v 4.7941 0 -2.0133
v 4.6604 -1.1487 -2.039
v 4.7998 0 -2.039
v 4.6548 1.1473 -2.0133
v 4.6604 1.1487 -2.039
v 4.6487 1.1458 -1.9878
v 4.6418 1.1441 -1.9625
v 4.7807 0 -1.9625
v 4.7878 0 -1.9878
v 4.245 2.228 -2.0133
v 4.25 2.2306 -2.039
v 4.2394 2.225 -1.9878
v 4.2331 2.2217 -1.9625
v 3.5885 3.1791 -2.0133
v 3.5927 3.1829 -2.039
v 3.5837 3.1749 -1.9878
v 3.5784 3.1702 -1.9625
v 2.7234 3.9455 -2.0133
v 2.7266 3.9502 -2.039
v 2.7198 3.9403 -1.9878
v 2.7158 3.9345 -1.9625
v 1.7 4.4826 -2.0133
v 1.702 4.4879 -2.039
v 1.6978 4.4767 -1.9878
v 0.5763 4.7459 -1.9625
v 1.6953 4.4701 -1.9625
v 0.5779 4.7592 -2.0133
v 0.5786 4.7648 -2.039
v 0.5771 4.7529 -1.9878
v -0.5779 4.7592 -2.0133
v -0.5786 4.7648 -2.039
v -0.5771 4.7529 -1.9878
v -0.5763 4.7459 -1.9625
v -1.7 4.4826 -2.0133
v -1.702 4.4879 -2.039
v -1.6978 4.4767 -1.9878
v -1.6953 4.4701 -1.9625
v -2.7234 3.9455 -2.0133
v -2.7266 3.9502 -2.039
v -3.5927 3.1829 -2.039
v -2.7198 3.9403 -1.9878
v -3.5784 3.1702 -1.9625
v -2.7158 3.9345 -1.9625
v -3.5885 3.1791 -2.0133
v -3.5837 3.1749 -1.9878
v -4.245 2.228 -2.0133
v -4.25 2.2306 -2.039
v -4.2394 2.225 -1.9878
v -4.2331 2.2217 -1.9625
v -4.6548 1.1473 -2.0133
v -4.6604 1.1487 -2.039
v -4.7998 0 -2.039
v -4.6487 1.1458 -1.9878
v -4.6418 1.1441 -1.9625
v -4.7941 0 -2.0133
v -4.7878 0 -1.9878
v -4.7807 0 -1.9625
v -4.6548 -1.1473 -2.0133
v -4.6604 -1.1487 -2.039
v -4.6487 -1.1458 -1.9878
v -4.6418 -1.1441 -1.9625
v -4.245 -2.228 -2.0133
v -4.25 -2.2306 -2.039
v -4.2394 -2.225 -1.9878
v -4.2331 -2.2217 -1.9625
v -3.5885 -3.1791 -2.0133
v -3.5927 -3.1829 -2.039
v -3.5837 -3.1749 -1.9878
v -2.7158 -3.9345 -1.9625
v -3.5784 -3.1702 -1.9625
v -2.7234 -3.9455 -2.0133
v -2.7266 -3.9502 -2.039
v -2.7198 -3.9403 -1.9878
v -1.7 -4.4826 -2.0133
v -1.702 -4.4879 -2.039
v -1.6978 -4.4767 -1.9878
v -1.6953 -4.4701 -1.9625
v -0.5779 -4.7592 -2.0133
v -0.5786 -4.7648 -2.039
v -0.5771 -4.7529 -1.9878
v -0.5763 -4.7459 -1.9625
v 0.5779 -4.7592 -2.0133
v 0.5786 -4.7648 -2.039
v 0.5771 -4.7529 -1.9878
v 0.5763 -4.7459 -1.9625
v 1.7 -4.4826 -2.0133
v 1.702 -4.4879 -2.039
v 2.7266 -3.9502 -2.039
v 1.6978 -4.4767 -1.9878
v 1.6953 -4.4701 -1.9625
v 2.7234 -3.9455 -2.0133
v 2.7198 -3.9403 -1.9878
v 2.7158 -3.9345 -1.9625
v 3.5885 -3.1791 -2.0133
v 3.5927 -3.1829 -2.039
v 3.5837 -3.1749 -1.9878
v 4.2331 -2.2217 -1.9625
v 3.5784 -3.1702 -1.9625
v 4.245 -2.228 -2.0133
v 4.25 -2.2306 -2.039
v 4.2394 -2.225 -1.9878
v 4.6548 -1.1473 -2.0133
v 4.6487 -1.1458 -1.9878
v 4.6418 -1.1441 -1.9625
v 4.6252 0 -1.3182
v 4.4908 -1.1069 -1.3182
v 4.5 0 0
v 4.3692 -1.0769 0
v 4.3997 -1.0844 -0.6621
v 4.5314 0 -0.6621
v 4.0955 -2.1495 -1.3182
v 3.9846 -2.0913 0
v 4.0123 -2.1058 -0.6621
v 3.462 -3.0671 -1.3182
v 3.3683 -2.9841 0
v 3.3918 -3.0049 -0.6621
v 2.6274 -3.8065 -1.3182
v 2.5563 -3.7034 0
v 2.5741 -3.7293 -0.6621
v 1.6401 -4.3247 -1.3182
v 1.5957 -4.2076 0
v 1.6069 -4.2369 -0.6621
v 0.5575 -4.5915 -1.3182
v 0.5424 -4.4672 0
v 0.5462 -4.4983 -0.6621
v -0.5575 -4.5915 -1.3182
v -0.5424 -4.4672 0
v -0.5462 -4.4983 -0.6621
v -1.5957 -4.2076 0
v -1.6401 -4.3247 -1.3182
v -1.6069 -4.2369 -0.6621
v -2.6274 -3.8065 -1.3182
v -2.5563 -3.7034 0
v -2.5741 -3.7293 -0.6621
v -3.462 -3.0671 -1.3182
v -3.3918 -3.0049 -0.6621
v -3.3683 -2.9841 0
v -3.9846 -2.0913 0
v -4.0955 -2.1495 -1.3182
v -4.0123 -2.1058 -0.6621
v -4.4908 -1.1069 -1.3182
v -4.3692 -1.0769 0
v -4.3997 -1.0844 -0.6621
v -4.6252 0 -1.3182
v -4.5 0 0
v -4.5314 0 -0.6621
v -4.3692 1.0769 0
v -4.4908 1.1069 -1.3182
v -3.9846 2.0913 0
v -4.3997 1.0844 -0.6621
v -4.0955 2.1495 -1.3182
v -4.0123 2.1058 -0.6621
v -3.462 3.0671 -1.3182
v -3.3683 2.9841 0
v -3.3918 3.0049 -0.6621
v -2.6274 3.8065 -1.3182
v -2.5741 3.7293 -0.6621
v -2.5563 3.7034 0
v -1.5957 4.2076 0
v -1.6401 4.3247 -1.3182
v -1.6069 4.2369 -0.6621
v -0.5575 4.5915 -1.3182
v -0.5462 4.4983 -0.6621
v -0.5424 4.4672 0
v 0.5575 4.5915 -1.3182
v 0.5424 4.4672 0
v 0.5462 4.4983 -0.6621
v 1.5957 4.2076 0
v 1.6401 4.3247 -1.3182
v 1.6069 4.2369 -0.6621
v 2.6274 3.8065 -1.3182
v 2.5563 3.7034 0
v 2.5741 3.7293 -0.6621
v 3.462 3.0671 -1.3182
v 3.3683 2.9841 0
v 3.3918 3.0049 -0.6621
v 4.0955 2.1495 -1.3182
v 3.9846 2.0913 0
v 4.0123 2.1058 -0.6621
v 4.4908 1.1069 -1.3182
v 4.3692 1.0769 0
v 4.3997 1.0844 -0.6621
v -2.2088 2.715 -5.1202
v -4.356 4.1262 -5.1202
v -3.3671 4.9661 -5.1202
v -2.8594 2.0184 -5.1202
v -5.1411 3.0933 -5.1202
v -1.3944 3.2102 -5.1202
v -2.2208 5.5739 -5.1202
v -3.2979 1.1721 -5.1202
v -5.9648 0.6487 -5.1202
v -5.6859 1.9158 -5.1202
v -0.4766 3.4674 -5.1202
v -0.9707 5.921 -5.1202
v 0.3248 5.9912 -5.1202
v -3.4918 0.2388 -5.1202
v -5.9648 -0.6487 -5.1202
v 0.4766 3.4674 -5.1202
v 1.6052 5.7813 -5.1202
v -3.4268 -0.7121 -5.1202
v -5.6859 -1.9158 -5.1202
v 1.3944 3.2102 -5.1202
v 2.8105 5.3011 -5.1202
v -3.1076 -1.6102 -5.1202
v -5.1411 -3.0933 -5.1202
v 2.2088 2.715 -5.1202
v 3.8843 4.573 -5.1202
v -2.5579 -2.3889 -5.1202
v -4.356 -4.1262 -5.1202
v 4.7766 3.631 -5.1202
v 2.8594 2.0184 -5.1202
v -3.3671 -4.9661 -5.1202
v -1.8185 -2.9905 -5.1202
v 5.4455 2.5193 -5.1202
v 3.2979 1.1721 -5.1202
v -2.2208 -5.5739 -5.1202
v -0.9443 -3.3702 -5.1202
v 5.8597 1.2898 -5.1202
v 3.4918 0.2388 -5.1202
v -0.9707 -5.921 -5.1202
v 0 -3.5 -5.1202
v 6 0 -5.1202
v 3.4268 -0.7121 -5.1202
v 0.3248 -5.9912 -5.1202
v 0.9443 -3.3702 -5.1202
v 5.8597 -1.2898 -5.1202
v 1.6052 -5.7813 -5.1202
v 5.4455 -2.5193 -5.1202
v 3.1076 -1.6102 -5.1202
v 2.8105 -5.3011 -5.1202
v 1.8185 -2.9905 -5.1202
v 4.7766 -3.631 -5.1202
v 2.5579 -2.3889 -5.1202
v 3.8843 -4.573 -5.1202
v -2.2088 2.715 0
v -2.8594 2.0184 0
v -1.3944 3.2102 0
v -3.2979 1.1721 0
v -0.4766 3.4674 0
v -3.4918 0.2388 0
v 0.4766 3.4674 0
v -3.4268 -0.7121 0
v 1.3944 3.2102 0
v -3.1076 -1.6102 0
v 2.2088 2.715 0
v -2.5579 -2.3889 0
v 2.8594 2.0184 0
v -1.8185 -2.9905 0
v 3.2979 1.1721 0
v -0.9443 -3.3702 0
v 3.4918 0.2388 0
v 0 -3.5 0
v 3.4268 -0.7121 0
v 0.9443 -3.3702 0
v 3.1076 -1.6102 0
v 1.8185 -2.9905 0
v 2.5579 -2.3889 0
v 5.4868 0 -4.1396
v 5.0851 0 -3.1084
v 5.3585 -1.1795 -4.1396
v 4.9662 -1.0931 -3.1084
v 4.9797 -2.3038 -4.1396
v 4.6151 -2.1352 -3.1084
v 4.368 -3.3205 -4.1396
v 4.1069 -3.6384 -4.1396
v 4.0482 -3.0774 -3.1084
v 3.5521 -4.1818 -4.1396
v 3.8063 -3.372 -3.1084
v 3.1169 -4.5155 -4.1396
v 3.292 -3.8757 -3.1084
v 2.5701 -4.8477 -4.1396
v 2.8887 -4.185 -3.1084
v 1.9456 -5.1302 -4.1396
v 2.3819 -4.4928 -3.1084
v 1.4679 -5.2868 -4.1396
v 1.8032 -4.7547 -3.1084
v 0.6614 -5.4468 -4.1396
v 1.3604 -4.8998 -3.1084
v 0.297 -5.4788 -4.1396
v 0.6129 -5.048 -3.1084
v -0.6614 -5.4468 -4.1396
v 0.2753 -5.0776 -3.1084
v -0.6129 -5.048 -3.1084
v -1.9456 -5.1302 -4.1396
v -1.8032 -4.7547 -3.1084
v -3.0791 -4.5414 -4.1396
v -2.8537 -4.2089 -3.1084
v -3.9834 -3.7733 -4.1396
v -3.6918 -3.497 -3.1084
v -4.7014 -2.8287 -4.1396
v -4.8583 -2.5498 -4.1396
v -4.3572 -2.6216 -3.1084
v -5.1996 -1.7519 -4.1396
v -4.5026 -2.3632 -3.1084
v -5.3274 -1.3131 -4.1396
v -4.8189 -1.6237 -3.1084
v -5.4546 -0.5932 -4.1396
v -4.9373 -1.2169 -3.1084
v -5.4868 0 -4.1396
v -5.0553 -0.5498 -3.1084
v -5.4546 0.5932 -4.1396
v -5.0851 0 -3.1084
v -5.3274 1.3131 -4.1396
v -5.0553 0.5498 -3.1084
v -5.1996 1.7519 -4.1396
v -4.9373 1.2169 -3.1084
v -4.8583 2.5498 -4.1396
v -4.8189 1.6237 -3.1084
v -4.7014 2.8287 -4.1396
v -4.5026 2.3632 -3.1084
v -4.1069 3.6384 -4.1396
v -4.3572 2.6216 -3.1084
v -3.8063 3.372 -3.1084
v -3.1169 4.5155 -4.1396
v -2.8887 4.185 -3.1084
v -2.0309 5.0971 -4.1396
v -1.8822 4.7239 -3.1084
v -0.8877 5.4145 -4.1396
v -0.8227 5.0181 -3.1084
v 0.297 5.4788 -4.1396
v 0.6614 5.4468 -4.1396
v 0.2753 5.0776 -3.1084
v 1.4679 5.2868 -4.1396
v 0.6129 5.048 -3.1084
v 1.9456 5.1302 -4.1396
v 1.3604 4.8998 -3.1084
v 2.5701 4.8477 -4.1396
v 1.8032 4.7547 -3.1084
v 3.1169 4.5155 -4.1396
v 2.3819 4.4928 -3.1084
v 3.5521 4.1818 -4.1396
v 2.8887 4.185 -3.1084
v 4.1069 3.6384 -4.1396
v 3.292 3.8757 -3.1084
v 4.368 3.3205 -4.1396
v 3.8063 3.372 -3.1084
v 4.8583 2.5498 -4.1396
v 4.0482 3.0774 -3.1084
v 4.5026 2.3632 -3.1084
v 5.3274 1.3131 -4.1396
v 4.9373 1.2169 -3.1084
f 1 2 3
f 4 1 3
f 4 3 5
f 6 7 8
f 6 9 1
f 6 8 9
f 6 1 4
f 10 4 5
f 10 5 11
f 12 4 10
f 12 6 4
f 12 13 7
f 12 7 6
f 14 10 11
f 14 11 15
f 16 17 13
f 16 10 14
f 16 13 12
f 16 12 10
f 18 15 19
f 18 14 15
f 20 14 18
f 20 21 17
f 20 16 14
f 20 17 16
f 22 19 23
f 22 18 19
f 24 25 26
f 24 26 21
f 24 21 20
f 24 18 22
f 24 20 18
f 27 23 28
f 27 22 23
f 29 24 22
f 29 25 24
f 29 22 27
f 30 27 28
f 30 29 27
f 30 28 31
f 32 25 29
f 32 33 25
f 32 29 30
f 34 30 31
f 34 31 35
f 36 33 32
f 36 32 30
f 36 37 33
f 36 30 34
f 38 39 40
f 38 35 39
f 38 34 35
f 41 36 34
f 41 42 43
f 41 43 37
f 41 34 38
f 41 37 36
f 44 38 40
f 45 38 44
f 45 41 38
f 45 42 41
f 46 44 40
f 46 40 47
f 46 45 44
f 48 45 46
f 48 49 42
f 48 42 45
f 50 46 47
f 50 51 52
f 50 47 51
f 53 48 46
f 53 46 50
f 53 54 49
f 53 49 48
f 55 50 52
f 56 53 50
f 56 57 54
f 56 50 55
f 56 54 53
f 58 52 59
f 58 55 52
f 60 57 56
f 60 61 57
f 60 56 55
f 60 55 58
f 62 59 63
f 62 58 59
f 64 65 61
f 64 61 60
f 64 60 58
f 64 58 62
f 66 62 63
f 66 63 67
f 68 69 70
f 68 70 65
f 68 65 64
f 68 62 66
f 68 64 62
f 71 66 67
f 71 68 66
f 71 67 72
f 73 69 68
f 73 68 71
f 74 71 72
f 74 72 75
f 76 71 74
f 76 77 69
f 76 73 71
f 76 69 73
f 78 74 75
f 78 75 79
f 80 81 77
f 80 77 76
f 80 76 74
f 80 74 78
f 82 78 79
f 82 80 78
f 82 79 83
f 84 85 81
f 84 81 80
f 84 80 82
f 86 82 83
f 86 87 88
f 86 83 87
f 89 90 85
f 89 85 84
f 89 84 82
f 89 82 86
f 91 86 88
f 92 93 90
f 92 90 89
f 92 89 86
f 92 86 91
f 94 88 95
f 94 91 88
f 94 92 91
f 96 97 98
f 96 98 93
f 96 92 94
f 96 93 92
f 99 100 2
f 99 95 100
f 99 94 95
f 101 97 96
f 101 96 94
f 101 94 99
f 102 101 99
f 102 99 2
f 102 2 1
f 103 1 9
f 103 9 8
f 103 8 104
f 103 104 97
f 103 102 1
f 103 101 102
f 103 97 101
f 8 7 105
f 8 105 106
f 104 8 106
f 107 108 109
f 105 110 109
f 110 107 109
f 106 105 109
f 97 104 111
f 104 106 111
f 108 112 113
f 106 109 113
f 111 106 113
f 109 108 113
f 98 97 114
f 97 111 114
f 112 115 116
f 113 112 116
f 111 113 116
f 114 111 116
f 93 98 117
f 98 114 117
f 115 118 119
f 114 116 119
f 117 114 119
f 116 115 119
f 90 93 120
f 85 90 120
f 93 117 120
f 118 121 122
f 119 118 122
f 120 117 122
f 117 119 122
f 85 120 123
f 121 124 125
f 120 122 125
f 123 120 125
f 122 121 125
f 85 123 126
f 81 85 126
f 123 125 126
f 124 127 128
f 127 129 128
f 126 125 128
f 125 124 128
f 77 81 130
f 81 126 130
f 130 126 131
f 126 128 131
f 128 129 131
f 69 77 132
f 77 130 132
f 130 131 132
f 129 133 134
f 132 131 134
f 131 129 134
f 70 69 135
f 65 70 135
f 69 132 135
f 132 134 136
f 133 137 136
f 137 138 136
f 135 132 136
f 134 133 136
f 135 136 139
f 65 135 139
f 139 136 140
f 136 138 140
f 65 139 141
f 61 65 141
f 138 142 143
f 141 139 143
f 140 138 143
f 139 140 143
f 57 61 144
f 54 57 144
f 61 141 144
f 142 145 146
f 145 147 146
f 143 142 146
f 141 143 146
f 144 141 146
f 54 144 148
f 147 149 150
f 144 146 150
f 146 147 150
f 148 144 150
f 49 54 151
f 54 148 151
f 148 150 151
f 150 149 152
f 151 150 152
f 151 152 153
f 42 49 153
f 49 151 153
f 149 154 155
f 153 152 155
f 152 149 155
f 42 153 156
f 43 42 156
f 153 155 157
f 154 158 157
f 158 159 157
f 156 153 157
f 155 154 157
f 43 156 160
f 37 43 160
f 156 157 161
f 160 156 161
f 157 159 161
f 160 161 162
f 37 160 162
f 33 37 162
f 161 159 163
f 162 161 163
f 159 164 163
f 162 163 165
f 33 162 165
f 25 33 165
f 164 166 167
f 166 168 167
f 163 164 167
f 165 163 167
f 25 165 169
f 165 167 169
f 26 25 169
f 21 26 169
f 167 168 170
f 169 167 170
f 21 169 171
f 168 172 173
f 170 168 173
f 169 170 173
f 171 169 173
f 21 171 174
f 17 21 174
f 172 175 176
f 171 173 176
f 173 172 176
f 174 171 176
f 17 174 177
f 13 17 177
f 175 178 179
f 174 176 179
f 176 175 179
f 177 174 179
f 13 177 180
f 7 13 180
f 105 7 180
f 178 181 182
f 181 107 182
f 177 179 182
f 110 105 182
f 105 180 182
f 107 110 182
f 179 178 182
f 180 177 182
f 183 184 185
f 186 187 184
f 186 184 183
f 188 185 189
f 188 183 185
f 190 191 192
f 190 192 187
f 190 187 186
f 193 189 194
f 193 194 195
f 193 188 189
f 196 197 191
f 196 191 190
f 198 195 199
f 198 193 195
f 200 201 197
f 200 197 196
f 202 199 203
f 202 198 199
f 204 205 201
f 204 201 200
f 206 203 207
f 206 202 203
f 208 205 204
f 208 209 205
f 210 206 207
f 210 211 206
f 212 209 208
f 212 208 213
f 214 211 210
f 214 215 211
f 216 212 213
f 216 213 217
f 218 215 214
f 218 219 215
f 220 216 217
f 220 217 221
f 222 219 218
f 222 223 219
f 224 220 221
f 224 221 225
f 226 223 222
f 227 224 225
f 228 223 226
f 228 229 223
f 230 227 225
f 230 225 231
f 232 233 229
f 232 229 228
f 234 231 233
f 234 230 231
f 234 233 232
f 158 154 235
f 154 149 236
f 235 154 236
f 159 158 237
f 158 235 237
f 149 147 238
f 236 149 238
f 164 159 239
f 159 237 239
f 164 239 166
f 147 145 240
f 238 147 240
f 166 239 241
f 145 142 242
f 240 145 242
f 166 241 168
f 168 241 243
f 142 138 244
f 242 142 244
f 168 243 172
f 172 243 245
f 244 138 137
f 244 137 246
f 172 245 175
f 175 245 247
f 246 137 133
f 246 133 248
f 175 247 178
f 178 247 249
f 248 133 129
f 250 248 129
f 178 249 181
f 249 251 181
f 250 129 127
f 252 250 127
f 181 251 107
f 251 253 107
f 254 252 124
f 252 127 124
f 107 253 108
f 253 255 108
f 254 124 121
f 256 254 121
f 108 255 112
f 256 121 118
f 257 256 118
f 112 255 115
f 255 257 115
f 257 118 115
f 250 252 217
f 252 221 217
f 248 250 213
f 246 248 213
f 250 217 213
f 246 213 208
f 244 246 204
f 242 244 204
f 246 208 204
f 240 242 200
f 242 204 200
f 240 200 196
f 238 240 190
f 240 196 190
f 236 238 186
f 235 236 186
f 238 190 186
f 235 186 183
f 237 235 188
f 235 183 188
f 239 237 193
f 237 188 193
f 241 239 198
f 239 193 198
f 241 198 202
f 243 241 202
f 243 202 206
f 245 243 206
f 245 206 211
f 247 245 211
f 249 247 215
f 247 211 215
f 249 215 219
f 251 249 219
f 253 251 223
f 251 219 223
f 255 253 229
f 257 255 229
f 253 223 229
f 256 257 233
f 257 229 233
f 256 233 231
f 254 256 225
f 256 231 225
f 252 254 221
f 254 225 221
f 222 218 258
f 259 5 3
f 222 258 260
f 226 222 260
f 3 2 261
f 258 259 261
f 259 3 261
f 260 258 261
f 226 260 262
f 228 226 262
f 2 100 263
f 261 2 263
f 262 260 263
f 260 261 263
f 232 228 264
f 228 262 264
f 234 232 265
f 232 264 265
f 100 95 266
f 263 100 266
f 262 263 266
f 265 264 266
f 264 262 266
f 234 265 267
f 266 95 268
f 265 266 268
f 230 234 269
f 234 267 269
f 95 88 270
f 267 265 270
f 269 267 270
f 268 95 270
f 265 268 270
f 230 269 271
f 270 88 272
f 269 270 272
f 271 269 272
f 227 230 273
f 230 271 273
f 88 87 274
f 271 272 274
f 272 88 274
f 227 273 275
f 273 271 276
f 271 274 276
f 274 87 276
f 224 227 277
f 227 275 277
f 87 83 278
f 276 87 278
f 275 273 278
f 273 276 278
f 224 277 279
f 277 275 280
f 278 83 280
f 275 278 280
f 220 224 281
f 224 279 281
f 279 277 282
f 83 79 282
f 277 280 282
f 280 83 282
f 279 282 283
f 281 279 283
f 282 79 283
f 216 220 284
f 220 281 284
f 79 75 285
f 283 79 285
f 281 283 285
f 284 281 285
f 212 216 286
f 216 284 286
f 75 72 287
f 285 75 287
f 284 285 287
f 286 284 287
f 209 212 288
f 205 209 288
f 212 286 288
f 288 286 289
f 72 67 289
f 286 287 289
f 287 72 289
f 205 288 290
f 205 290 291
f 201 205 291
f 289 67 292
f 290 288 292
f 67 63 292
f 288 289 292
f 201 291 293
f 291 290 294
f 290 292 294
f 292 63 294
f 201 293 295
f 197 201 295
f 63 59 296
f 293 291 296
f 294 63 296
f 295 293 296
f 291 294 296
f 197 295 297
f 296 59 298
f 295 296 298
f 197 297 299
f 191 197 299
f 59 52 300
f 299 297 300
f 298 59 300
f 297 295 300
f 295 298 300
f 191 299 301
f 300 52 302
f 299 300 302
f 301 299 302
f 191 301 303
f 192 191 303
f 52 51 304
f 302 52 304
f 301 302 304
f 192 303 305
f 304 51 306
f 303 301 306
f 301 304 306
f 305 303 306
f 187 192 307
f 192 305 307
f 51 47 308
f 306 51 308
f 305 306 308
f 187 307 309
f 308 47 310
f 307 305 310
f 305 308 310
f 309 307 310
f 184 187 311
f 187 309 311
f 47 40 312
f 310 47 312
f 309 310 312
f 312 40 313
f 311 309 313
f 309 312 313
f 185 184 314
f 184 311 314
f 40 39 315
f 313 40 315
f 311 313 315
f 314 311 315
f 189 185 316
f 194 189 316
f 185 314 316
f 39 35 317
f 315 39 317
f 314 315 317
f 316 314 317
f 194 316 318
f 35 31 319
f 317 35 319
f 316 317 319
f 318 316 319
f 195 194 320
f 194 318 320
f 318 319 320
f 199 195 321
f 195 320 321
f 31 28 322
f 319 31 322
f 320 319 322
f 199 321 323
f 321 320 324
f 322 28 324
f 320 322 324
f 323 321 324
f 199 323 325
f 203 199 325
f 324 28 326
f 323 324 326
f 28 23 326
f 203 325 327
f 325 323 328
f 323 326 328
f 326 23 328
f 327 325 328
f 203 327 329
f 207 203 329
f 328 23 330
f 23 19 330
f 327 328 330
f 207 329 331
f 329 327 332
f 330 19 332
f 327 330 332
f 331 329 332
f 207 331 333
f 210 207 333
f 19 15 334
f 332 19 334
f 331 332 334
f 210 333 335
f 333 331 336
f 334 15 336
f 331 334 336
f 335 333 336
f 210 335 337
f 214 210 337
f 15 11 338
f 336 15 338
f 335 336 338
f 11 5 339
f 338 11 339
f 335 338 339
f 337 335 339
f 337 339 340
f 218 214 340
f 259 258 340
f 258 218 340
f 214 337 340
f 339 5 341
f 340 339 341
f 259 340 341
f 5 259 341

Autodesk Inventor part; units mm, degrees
ref_plane "YZ Plane" through (0, 0, 0) normal (1, 0, 0) x (0, 1, 0)
ref_plane "XZ Plane" through (0, 0, 0) normal (0, 1, 0) x (-1, 0, 0)
ref_plane "XY Plane" through (0, 0, 0) normal (0, 0, 1) x (1, 0, 0)
sketch "Sketch1" plane through (0, 0, 0) normal (0, 1, 0) x (-1, 0, 0)
  line L0 (0, 0) -> (0, -8)
  line L1 (0, 0) -> (-4.5, 0)
  arc A0 (-4.7918, -2) -> (-4.5, 0) centre (-11.5, 0) ccw
  line L2 (-6, -5.1202) -> (0, -5.1202)
  arc A1 (-6, -5.1202) -> (-4.7918, -2) centre (-14.5898, 0) ccw
  dimension "d6" = 8
  dimension "d7" = 7
  dimension "d9" = 12
  dimension "d10" = 9
  dimension "d11" = 10
  dimension "d12" = 2
revolve "Revolution1" add sketch "Sketch1" angle 360 about axis through (0, 0, 0) along (0, 0, -1)
sketch "Sketch2" plane through (0, 0, 0) normal (0, 0, 1) x (1, 0, 0)
  circle A0 centre (0, 0) radius 4.5 construction
hole "Hole1" at (0, 0, 0) direction (0, 0, -1) diameter 7 depth 5.1202
fillet "Fillet1" radius 1 1 edges at (-4.7918, 0, -2)
properties part number "VenturiEinsatz" material "Copper"
